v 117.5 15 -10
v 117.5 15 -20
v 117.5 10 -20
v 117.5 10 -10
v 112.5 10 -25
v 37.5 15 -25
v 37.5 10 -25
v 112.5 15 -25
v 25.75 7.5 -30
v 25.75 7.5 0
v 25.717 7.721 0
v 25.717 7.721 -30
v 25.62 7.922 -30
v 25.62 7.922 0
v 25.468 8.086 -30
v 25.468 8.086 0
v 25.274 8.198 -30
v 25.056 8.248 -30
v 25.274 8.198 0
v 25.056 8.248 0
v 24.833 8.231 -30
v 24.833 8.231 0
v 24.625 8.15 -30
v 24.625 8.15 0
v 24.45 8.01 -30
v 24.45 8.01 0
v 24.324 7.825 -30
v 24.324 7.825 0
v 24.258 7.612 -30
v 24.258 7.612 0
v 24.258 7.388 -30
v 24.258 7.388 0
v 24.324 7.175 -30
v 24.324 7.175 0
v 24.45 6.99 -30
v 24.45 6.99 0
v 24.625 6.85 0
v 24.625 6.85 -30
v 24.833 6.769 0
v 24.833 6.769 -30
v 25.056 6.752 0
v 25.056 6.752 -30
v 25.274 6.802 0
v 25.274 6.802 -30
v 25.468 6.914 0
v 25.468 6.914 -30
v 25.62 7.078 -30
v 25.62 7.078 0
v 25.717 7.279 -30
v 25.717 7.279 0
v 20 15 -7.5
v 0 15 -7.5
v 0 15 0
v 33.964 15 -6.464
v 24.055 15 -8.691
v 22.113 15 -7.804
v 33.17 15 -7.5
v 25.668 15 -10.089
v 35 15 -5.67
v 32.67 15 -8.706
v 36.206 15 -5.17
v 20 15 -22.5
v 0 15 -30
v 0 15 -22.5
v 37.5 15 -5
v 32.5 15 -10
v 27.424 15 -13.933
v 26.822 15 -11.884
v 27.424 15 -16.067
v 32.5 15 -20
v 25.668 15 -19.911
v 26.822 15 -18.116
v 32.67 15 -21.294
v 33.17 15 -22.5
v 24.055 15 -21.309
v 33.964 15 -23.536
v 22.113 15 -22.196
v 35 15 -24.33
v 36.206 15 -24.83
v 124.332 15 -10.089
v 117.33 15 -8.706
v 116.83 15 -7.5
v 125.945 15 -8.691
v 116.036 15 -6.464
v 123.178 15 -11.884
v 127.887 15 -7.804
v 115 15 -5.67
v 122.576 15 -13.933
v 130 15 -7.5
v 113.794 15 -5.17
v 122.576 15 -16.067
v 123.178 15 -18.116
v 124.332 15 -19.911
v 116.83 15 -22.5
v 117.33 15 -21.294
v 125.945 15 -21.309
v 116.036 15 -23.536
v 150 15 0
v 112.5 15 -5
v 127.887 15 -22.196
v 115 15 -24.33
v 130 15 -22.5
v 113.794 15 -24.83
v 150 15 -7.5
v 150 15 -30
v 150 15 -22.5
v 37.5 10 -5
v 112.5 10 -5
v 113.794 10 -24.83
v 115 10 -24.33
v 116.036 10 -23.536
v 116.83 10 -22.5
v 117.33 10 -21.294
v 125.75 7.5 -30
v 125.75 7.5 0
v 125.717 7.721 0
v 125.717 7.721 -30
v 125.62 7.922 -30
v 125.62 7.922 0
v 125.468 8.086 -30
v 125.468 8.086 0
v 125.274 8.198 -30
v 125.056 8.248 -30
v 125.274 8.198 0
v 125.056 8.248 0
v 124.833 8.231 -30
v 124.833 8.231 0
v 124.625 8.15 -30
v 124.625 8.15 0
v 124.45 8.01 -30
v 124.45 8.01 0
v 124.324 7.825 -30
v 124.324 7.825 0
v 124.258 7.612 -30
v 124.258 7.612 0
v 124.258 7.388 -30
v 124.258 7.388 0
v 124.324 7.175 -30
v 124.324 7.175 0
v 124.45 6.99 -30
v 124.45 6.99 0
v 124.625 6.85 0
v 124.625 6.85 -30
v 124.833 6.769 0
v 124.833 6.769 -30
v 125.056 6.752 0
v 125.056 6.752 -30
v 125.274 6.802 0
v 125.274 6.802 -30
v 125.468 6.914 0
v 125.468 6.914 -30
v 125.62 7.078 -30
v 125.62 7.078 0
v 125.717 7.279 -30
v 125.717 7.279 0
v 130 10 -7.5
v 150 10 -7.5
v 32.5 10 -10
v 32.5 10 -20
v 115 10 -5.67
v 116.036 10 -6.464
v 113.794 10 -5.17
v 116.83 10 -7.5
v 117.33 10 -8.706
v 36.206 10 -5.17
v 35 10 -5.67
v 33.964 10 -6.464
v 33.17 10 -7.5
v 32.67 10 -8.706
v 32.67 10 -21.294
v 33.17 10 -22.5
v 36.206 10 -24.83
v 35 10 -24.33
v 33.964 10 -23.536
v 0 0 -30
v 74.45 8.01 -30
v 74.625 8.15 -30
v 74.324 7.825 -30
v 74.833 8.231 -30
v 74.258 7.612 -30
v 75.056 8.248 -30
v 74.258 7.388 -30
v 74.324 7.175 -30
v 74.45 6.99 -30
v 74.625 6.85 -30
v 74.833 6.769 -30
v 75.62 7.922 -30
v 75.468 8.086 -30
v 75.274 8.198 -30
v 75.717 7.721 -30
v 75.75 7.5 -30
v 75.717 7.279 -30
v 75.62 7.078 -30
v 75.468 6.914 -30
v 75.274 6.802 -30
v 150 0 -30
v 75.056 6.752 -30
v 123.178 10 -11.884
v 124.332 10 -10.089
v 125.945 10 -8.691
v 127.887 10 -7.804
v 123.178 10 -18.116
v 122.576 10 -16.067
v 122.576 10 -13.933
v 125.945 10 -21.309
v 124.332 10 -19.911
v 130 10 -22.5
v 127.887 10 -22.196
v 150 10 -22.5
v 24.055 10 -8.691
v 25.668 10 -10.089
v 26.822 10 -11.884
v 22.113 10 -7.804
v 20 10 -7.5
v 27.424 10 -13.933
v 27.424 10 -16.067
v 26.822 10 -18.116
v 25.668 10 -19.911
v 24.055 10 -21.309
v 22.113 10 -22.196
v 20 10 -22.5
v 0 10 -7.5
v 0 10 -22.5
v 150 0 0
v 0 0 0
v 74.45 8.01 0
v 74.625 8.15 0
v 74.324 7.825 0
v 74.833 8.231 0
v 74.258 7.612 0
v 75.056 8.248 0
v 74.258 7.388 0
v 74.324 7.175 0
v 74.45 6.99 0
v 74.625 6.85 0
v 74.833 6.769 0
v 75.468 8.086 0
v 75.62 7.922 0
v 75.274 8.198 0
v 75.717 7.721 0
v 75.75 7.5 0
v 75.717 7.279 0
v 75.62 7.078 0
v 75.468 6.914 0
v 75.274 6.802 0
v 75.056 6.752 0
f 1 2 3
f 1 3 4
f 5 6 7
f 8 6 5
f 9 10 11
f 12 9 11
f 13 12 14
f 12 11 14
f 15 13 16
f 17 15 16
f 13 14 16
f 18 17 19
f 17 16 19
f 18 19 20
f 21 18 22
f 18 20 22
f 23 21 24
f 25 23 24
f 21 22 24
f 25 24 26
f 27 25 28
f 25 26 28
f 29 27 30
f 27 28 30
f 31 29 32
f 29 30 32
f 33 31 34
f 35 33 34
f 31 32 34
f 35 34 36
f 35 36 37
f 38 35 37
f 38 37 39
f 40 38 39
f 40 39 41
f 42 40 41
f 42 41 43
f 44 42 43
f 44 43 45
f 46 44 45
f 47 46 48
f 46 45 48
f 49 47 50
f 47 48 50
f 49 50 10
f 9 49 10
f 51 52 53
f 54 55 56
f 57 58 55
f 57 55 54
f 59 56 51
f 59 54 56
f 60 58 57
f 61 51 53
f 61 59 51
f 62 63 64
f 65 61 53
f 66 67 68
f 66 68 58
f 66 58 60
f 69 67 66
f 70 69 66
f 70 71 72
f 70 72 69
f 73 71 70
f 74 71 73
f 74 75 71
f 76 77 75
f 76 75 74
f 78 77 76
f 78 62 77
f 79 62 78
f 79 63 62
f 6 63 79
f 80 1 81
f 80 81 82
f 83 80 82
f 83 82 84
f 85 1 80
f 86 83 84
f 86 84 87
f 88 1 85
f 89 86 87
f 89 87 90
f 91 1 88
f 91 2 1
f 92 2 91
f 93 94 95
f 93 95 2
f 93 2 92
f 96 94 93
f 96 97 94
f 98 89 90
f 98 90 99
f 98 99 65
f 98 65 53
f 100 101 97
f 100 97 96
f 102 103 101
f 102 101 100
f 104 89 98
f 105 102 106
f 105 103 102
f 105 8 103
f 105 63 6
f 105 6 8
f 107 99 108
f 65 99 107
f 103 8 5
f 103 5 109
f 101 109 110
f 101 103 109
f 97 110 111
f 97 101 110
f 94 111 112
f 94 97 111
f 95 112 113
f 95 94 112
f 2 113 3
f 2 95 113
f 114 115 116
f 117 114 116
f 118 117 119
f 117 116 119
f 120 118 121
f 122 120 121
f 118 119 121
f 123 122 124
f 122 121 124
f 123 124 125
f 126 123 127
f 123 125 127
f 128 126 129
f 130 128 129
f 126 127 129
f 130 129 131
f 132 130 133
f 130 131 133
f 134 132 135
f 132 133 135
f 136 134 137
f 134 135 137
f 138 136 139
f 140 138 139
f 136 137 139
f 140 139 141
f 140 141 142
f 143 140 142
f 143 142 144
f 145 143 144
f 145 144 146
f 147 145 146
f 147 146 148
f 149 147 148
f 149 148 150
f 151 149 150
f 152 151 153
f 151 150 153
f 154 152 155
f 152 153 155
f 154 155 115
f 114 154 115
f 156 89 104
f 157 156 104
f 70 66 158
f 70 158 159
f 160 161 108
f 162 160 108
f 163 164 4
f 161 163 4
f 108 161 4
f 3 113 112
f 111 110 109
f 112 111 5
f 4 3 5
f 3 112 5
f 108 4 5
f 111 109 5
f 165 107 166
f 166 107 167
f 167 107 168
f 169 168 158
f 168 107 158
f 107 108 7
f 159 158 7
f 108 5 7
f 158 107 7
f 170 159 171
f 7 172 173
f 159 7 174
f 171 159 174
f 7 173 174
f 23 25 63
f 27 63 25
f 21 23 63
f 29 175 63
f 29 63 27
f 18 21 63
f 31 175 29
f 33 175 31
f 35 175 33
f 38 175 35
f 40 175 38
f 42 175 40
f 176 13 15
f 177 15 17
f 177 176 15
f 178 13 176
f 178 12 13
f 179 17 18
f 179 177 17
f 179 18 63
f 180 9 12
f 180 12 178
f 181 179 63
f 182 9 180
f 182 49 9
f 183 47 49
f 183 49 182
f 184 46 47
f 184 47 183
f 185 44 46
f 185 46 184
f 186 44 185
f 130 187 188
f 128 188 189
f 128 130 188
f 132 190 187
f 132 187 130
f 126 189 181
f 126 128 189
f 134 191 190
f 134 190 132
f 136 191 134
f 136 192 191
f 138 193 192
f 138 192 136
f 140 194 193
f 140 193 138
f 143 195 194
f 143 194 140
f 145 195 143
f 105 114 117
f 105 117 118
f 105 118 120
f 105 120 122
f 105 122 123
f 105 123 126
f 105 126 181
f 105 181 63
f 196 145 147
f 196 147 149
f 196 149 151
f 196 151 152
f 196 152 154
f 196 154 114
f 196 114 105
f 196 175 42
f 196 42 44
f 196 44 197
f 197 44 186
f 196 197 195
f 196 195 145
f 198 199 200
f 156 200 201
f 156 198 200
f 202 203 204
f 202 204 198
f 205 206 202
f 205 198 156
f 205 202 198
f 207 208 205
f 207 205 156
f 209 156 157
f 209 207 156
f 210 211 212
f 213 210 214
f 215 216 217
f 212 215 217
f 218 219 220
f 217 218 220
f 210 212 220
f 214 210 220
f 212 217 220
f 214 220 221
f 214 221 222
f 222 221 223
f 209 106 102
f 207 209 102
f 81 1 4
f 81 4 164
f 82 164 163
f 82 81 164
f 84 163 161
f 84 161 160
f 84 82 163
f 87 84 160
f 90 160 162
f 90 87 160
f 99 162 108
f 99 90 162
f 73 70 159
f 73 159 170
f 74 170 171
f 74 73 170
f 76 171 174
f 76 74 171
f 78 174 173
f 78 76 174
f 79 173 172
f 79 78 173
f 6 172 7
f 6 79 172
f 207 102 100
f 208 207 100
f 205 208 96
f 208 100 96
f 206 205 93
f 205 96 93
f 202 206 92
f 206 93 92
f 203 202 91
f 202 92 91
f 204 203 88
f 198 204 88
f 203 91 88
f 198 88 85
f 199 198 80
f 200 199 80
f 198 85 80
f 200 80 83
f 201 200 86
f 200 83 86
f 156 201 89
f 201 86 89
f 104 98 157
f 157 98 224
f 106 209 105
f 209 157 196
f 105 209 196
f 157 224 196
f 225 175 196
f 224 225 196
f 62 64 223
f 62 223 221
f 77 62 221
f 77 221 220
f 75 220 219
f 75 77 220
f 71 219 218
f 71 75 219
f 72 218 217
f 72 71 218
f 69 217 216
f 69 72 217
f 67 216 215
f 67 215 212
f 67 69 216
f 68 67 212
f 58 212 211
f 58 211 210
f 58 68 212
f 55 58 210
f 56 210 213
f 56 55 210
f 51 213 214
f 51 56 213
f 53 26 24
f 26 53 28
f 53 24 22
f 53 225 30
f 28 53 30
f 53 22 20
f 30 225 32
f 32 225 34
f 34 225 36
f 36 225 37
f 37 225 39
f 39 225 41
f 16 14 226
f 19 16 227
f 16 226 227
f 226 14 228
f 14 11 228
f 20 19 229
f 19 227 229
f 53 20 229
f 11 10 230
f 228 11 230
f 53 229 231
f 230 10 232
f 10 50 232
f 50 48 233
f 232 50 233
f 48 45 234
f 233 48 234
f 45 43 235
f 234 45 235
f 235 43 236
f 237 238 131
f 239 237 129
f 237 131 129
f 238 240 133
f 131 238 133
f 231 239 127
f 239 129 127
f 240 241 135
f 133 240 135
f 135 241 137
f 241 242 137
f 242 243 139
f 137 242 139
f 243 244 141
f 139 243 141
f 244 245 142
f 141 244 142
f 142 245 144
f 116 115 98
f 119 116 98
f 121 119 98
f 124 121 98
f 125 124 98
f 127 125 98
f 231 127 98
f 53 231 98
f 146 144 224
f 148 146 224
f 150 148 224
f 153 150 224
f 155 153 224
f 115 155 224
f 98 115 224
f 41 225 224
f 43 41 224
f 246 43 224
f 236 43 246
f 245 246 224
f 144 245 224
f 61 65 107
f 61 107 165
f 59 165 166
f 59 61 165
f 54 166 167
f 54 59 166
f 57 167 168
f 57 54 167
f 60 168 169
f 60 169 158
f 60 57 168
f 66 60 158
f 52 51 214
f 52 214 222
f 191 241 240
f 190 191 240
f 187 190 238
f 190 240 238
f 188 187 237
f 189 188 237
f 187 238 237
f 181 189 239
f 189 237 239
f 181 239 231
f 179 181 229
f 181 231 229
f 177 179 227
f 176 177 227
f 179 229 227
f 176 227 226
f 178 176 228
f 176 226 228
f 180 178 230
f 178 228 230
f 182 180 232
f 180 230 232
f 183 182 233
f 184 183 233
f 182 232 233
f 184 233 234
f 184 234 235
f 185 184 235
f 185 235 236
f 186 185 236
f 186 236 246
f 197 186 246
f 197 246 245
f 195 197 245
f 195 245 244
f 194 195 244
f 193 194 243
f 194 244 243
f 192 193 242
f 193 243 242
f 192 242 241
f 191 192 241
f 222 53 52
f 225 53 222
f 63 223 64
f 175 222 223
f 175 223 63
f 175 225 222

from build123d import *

# Parameters (mm, degrees)
SKETCH1_W           = 150
SKETCH1_H           = 30
BOSS_EXTRUDE1_DEPTH = 15
CUT_EXTRUDE1_DEPTH  = 5
SKETCH3_R           = 0.75
CUT_EXTRUDE2_DEPTH  = 30
CUT_EXTRUDE3_DEPTH  = 5


with BuildPart() as part:
    # Sketch1 → Boss-Extrude1 (new body)
    with BuildSketch(Plane(origin=(0, 0, 0), x_dir=(1, 0, 0), z_dir=(0, 1, 0))):
        with Locations((75, 15)):
            Rectangle(SKETCH1_W, SKETCH1_H)
    extrude(amount=BOSS_EXTRUDE1_DEPTH)

    # Sketch2 → Cut-Extrude1 (cut)
    with BuildSketch(Plane(origin=(0, 15, 0), x_dir=(1, 0, 0), z_dir=(0, 1, 0))):
        with BuildLine():
            Line((-20, 22.5), (20, 22.5))
            ThreePointArc((20, 22.5), (27.5, 15), (20, 7.5))
            Line((20, 7.5), (-20, 7.5))
            ThreePointArc((-20, 7.5), (-27.5, 15), (-20, 22.5))
        make_face()
        with BuildLine():
            Line((170, 22.5), (130, 22.5))
            ThreePointArc((130, 22.5), (122.5, 15), (130, 7.5))
            Line((130, 7.5), (170, 7.5))
            ThreePointArc((170, 7.5), (177.5, 15), (170, 22.5))
        make_face()
    extrude(amount=-CUT_EXTRUDE1_DEPTH, mode=Mode.SUBTRACT)

    # Sketch3 → Cut-Extrude2 (cut)
    with BuildSketch(Plane.XY):
        with Locations((25, 7.5)):
            Circle(SKETCH3_R)
        with Locations((75, 7.5)):
            Circle(SKETCH3_R)
        with Locations((125, 7.5)):
            Circle(SKETCH3_R)
    extrude(amount=-CUT_EXTRUDE2_DEPTH, mode=Mode.SUBTRACT)

    # Sketch4 → Cut-Extrude3 (cut)
    with BuildSketch(Plane(origin=(0, 15, 0), x_dir=(1, 0, 0), z_dir=(0, 1, 0))):
        with BuildLine():
            Line((37.5, 25), (112.5, 25))
            ThreePointArc((112.5, 25), (116.035533906, 23.535533906), (117.5, 20))
            Line((117.5, 20), (117.5, 10))
            ThreePointArc((117.5, 10), (116.035533906, 6.464466094), (112.5, 5))
            Line((112.5, 5), (37.5, 5))
            ThreePointArc((37.5, 5), (33.964466094, 6.464466094), (32.5, 10))
            Line((32.5, 10), (32.5, 20))
            ThreePointArc((32.5, 20), (33.964466094, 23.535533906), (37.5, 25))
        make_face()
    extrude(amount=-CUT_EXTRUDE3_DEPTH, mode=Mode.SUBTRACT)


solid = part.part
